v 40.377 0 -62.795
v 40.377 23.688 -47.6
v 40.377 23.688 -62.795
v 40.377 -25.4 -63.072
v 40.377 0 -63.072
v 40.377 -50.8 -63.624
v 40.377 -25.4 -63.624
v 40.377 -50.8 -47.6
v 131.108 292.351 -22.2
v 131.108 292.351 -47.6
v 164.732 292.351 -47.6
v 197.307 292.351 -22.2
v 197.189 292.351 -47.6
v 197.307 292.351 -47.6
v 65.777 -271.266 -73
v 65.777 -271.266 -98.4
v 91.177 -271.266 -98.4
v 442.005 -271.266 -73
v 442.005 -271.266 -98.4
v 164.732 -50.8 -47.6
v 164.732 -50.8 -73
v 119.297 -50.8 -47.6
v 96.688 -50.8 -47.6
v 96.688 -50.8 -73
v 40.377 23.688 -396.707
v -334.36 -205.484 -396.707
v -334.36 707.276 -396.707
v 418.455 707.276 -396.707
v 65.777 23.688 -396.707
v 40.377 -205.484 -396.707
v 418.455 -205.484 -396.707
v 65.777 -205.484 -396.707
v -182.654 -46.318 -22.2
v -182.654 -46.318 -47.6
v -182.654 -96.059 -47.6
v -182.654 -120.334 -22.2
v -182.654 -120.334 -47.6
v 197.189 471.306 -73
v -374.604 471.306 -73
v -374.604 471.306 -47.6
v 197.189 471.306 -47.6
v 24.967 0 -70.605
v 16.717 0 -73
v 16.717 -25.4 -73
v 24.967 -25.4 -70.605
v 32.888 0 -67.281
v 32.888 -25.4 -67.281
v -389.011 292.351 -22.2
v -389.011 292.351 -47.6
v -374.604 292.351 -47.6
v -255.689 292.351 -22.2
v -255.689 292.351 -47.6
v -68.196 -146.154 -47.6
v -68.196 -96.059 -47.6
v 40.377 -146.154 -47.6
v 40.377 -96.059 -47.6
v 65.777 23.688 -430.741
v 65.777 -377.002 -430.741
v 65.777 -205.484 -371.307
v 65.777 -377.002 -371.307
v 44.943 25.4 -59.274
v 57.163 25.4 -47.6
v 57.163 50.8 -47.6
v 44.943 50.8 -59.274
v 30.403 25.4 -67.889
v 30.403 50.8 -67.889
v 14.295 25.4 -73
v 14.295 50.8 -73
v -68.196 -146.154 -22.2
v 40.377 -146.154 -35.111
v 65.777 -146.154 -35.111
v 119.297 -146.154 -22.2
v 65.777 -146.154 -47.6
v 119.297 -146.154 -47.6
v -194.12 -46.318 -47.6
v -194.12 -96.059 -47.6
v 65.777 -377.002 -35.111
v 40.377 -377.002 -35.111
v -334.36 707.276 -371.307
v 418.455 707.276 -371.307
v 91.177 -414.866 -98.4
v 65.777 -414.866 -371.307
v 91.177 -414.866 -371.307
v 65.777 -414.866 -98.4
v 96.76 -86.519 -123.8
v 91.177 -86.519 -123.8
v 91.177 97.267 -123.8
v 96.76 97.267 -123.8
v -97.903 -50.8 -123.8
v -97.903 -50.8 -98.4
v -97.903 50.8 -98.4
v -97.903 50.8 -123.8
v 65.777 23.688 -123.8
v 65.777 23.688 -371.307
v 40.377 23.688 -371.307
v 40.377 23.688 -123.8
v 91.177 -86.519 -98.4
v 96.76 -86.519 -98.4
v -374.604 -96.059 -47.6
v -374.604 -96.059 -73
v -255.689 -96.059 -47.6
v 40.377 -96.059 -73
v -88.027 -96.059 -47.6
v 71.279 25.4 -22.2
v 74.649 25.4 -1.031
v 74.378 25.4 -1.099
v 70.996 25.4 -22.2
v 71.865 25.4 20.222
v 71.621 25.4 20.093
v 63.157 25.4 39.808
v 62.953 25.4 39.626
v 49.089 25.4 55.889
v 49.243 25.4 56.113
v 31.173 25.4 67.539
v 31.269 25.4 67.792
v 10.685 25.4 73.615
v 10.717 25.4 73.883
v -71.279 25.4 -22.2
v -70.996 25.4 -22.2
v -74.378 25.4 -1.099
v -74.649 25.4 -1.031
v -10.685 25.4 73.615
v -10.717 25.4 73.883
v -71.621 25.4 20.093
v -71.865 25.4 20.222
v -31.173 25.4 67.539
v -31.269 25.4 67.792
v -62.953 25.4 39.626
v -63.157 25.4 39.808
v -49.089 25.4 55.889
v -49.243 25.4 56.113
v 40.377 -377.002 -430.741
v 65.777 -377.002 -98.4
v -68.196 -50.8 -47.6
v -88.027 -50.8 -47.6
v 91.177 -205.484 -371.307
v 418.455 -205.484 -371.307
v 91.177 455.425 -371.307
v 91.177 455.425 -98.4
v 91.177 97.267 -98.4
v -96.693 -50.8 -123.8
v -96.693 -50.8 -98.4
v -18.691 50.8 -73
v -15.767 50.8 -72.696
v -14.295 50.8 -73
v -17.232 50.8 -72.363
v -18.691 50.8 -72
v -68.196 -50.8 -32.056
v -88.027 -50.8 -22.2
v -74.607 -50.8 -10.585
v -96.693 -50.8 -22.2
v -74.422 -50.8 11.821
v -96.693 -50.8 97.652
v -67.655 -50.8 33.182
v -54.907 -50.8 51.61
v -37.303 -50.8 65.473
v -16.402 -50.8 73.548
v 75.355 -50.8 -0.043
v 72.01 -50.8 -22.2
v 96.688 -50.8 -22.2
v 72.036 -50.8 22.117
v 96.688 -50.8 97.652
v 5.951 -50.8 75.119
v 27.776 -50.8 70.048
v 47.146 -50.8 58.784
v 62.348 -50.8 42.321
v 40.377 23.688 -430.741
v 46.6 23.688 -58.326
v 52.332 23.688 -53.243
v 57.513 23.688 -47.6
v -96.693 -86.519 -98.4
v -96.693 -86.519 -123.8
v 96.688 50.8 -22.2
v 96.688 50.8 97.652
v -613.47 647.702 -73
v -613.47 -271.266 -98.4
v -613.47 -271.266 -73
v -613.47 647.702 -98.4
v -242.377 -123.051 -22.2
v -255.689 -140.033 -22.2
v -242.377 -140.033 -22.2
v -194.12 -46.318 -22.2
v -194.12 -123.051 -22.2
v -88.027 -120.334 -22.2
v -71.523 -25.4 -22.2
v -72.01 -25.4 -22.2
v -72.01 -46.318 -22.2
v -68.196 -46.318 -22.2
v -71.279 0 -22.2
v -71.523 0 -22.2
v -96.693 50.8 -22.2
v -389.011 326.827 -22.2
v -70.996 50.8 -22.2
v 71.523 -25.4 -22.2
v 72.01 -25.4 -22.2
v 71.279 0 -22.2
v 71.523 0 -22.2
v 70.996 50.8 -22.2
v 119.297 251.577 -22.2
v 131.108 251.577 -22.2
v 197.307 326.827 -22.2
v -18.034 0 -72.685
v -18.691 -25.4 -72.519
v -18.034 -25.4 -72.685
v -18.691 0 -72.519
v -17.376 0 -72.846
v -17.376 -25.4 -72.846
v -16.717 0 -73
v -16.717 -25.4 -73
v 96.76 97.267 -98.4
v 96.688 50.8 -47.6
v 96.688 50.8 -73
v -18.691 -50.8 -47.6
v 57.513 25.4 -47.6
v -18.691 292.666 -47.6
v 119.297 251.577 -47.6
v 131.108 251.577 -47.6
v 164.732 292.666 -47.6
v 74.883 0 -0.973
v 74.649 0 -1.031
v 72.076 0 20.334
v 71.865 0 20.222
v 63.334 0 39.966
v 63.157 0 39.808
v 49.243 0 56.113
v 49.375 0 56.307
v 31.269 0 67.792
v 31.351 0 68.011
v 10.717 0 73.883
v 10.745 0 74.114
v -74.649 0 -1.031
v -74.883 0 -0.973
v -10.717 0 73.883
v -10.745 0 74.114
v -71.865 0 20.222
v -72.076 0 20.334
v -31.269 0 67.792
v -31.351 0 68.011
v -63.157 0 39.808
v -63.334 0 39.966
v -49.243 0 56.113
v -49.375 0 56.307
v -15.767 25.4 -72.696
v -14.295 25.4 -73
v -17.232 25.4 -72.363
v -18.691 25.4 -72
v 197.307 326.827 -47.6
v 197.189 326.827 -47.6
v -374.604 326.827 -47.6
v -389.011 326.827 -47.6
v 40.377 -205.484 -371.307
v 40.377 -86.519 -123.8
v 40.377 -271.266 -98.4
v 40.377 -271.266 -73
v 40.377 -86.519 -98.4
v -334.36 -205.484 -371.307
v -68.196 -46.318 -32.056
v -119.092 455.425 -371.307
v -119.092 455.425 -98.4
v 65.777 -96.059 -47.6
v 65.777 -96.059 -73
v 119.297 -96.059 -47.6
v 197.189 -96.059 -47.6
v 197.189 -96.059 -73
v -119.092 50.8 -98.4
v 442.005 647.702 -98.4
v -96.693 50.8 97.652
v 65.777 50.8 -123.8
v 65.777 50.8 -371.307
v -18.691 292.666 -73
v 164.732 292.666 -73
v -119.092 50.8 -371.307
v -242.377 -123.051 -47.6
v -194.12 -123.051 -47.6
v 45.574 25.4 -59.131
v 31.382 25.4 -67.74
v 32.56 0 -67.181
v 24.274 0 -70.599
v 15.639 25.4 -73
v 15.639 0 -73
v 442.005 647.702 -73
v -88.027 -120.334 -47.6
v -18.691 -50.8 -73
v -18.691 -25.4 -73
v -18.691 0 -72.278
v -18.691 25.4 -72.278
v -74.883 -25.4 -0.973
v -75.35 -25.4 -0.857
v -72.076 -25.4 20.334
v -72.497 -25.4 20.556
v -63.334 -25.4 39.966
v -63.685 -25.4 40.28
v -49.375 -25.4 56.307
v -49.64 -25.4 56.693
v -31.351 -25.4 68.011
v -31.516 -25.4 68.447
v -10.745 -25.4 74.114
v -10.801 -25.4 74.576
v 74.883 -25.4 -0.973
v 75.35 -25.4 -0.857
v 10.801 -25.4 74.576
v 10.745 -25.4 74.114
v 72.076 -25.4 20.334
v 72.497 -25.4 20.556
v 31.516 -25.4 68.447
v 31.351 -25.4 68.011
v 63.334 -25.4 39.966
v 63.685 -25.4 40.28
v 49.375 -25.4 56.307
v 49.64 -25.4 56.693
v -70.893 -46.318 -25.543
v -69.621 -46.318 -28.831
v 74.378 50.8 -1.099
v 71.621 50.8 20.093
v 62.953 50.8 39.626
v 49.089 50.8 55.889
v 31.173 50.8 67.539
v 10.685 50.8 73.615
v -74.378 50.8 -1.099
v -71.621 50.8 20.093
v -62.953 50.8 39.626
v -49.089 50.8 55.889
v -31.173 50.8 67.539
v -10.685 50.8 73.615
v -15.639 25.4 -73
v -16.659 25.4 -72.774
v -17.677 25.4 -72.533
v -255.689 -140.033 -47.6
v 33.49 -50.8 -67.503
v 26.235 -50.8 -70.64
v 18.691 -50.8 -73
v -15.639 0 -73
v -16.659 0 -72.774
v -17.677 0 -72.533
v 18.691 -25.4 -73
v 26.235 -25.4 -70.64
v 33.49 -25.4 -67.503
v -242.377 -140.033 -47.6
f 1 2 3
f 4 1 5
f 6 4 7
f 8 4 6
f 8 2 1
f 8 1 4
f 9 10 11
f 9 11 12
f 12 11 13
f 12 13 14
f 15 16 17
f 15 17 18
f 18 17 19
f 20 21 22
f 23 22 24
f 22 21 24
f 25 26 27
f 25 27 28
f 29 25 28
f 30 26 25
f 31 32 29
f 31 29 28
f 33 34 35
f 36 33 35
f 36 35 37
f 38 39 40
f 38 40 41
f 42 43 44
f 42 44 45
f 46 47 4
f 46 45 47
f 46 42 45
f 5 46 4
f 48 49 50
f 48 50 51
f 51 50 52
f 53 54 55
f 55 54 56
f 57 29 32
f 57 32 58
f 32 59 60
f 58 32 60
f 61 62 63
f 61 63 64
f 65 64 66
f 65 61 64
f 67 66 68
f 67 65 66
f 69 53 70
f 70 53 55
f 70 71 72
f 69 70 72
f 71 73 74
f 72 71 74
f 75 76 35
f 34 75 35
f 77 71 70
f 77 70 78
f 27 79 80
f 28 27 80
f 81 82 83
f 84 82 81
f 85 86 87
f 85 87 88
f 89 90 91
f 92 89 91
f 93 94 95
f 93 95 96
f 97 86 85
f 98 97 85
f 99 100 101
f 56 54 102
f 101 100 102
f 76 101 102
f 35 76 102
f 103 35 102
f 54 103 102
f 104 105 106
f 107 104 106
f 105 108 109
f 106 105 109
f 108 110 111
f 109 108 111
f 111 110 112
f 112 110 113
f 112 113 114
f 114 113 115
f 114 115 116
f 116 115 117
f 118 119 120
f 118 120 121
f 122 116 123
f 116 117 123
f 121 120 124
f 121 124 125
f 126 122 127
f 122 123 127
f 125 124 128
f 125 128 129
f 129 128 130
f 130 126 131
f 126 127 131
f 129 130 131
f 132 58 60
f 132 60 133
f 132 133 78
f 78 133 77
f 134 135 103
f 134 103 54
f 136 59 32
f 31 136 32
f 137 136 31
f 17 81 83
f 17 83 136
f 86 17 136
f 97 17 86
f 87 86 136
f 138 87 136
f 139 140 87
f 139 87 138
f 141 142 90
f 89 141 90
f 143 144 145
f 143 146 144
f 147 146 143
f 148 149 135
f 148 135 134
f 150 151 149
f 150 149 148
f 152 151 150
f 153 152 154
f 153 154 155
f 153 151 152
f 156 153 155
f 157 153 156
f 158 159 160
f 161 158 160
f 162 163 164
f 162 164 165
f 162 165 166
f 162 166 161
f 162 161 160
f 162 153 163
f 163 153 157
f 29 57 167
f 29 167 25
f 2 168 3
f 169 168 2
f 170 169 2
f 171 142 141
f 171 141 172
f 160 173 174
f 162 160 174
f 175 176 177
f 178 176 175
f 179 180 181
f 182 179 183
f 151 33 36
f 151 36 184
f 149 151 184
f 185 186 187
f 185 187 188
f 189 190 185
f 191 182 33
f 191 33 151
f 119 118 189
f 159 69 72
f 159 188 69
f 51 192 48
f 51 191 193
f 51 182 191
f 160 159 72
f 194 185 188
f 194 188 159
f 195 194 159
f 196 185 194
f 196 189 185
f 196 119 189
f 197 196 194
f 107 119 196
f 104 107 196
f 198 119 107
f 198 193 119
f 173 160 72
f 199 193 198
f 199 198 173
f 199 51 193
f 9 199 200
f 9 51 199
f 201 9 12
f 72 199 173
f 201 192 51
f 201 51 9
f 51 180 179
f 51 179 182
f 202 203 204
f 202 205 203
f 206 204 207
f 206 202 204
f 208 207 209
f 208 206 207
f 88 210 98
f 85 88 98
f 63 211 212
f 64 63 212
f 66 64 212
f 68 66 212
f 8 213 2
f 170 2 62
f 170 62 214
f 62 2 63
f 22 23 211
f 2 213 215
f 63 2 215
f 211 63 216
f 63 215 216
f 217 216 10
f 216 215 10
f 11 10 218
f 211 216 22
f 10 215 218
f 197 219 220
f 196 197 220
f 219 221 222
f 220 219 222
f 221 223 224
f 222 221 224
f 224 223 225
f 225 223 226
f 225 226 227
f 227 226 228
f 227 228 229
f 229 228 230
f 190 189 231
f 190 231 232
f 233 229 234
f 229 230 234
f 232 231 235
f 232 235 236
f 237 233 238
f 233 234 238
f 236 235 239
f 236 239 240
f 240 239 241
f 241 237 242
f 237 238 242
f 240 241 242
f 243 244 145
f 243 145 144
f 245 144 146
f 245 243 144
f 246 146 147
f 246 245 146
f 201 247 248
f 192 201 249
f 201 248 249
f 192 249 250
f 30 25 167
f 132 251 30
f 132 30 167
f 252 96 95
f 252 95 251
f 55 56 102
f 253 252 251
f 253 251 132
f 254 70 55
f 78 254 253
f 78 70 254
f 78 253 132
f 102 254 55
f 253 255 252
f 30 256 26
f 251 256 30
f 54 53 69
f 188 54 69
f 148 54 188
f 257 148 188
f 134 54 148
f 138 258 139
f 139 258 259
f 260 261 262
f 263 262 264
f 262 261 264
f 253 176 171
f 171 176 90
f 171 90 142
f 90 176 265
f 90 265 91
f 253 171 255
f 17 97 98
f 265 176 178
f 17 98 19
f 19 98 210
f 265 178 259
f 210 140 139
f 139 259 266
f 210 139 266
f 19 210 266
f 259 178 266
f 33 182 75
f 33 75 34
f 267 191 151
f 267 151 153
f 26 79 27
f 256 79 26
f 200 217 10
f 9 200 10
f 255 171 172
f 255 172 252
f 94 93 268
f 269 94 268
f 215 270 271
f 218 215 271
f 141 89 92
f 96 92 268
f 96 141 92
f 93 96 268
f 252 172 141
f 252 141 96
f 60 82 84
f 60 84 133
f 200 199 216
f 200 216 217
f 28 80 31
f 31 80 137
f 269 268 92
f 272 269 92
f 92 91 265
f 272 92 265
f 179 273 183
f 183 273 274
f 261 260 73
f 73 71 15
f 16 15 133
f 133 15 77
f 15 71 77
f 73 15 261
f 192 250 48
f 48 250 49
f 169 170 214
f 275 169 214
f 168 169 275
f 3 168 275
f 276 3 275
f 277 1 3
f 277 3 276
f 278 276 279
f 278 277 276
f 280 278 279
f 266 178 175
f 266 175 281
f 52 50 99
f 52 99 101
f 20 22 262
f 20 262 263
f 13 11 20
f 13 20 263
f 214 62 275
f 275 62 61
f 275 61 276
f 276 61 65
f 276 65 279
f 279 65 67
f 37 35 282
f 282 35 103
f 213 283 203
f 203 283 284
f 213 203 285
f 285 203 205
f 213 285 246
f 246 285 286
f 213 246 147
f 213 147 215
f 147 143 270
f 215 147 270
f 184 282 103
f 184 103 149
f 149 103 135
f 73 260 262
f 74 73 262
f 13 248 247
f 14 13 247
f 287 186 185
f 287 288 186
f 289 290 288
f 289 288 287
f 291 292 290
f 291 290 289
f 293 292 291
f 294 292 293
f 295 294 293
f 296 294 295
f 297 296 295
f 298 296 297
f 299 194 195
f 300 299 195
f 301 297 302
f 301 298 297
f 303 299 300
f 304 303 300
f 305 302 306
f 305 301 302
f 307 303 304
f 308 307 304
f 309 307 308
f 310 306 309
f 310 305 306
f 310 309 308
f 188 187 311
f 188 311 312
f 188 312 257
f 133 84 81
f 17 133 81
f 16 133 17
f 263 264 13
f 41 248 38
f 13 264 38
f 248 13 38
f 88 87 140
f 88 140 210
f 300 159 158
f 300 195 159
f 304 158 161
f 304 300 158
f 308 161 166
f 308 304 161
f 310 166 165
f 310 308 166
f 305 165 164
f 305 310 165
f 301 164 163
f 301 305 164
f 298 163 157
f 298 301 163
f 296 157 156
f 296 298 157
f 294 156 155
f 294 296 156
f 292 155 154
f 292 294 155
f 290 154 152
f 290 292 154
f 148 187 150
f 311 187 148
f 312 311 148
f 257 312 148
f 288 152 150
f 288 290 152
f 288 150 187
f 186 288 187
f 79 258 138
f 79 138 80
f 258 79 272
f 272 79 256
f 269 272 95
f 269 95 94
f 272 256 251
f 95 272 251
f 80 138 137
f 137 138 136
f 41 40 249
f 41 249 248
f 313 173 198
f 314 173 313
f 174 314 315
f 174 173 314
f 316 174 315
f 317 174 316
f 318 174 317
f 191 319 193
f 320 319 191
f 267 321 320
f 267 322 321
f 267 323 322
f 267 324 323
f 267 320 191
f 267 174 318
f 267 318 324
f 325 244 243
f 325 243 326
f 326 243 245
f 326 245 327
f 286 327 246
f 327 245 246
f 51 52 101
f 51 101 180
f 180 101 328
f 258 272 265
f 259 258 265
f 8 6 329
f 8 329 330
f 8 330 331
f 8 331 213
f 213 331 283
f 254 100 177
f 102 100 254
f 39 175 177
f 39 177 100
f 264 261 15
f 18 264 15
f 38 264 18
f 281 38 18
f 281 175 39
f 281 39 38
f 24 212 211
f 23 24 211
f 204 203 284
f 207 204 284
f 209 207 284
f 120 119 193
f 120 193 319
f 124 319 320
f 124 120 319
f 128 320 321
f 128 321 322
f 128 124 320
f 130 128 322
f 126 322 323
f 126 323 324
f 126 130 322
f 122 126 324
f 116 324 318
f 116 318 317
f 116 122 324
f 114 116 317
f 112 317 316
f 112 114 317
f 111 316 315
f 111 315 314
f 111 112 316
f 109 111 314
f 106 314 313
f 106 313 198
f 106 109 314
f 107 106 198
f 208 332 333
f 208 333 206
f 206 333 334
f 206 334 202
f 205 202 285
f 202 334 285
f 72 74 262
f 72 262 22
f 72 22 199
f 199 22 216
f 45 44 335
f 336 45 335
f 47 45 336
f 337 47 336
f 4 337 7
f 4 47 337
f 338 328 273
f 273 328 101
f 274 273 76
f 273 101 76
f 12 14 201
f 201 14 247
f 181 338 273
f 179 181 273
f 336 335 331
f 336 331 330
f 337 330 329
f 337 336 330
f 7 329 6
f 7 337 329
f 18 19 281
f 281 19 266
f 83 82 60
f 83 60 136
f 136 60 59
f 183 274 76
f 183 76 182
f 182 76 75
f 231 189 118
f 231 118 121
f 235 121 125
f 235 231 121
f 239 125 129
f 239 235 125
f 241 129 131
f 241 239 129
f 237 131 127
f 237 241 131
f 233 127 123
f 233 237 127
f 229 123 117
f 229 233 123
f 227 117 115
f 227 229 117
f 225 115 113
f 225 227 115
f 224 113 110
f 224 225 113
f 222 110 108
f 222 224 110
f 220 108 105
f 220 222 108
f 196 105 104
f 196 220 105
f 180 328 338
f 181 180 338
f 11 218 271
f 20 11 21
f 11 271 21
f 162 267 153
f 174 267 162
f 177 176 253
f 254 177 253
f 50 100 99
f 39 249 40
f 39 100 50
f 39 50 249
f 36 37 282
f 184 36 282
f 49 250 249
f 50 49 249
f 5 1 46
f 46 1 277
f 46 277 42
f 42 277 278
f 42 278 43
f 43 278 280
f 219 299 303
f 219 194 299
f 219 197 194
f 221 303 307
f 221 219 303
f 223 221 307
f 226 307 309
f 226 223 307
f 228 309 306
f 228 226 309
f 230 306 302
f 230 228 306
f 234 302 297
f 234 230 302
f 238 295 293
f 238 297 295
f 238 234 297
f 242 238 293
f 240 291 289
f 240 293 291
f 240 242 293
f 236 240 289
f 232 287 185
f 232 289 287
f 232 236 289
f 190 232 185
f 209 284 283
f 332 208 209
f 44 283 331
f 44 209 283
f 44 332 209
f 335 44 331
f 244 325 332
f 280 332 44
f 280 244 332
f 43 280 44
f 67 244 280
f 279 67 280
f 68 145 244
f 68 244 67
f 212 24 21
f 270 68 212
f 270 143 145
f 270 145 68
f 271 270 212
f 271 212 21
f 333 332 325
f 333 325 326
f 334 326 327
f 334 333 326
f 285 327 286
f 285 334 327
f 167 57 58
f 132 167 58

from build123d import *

# Parameters (mm, degrees)
F0_W      = 193.3809220791
F0_H      = 196.0519328713
F0_R      = 74.8892897361
F1_DEPTH  = 25.4
F2_W      = 193.3809220791
F2_H      = 196.0519328713
F2_R      = 74.655991807
F3_DEPTH  = 25.4
F4_W      = 176.1402115226
F4_H      = 196.0519328713
F4_R      = 74.3860816692
F4_W_2    = 17.2407105565
F5_DEPTH  = 25.4
F6_W      = 193.3809220791
F6_H      = 196.0519328713
F6_R      = 75.3545401658
F7_DEPTH  = 25.4
F8_W      = 193.4532523155
F8_H      = 35.7192189813
F9_DEPTH  = 25.4
F11_DEPTH = 404.6249985695
F12_W     = 1055.474460125
F12_H     = 918.9680218697
F13_DEPTH = 25.4
F14_W     = 752.8154850006
F14_H     = 912.7593636513
F15_DEPTH = 25.4
F16_W     = 870.2914460182
F16_H     = 272.9075178504
F17_DEPTH = 25.4
F18_W     = 400.6907343864
F18_H     = 395.6300988793
F19_DEPTH = 25.4
F20_W     = 571.7930793762
F20_H     = 567.36561656
F21_DEPTH = 25.4
F23_W     = 78.0102312565
F23_H     = 34.4761013985
F23_W_2   = 13.3122801781
F23_H_2   = 332.7346146107
F23_W_3   = 187.4931752682
F23_H_3   = 105.7706475258
F23_H_4   = 99.6497869492
F24_DEPTH = 25.4
F25_W     = 101.5389561653
F25_H     = 251.5766620636
F25_H_2   = 50.2630472183
F25_W_2   = 29.5691788197
F25_W_3   = 54.5960366726
F25_H_3   = 76.733738184
F26_DEPTH = 25.4


with BuildPart() as f1:
    # F0 (on Front) → F1 (new body)
    with BuildSketch(Plane.XZ):
        with Locations((-0.0024288893, -0.3737099469)):
            Rectangle(F0_W, F0_H)
        Circle(F0_R, mode=Mode.SUBTRACT)
    extrude(amount=F1_DEPTH)

    # F2 (on face) → F3 (join)
    with BuildSketch(Plane(origin=(0, 0, 0), x_dir=(-1, 0, 0), z_dir=(0, 1, 0))):
        with Locations((0.0024288893, -0.3737099469)):
            Rectangle(F2_W, F2_H)
        Circle(F2_R, mode=Mode.SUBTRACT)
    extrude(amount=F3_DEPTH)

    # F4 (on face) → F5 (join)
    with BuildSketch(Plane(origin=(0, 25.4, 0), x_dir=(-1, 0, 0), z_dir=(0, 1, 0))):
        with Locations((-8.617926389, -0.3737099469)):
            Rectangle(F4_W, F4_H)
        Circle(F4_R, mode=Mode.SUBTRACT)
        with Locations((88.0725346506, -0.3737099469)):
            Rectangle(F4_W_2, F4_H)
    extrude(amount=F5_DEPTH)

    # F6 (on face) → F7 (join)
    with BuildSketch(Plane.XZ.offset(25.4)):
        with Locations((-0.0024288893, -0.3737099469)):
            Rectangle(F6_W, F6_H)
        Circle(F6_R, mode=Mode.SUBTRACT)
    extrude(amount=F7_DEPTH)

    # F8 (on face) → F9 (join)
    with BuildSketch(Plane(origin=(0, 0, -98.3996763825), x_dir=(1, 0, 0), z_dir=(0, 0, -1))):
        with Locations((0.0337362289, 68.6596094906)):
            Rectangle(F8_W, F8_H)
        Polygon((96.7603623867, 50.8), (-96.6928899288, 50.8), (-97.9034900665, 50.8), (-97.9034900665, -97.2673520446), (96.7603623867, -97.2673520446), align=None)
    extrude(amount=F9_DEPTH)

    # F10 (on face) → F11 (join)
    with BuildSketch(Plane(origin=(0, 50.8, 0), x_dir=(-1, 0, 0), z_dir=(0, 1, 0))):
        Polygon((-65.7769590616, -350.3327965736), (-65.7769590616, -371.3071942329), (119.0916895866, -371.3071942329), (119.0916895866, -98.3996763825), (-65.7769590616, -98.3996763825), align=None)
    extrude(amount=F11_DEPTH)

    # F12 (on face) → F13 (join)
    with BuildSketch(Plane.XY.offset(-98.3996763825)):
        with Locations((-85.7326686382, 188.2182061672)):
            Rectangle(F12_W, F12_H)
    extrude(amount=F13_DEPTH)

    # F14 (on face) → F15 (join)
    with BuildSketch(Plane(origin=(0, 0, -371.3071942329), x_dir=(1, 0, 0), z_dir=(0, 0, -1))):
        with Locations((42.0474410057, -250.8960068226)):
            Rectangle(F14_W, F14_H)
    extrude(amount=F15_DEPTH)

    # F16 (on face) → F17 (join)
    with BuildSketch(Plane.YZ.offset(65.7769590616)):
        with Locations((20.2792755604, -234.8534353077)):
            Rectangle(F16_W, F16_H)
    extrude(amount=F17_DEPTH)

    # F18 (on face) → F19 (join)
    with BuildSketch(Plane(origin=(65.7769590616, 0, 0), x_dir=(0, -1, 0), z_dir=(-1, 0, 0))):
        with Locations((176.6569912434, -232.9259328544)):
            Rectangle(F18_W, F18_H)
    extrude(amount=F19_DEPTH)

    # F20 (on face) → F21 (join)
    with BuildSketch(Plane.XY.offset(-72.9996763825)):
        with Locations((-88.7070894241, 187.6235455275)):
            Rectangle(F20_W, F20_H)
        Polygon((40.3769590616, -50.8), (-18.691013125, -50.8), (-18.691013125, 275.1325964928), (-18.691013125, 292.6656007767), (40.3769590616, 292.6656007767), (164.7324860096, 292.6656007767), (164.7324860096, -50.8), (129.8503279686, -50.8), align=None, mode=Mode.SUBTRACT)
    extrude(amount=F21_DEPTH)

    # F23 (on face) → F24 (join)
    with BuildSketch(Plane.XY.offset(-47.5996763825)):
        Polygon((119.2969679832, -40.3836667538), (119.2969679832, 292.3509478569), (-242.377102375, 292.3509478569), (-242.377102375, -40.3836667538), (-68.1962072849, -40.3836667538), align=None)
        with Locations((158.3020836115, 309.5889985561)):
            Rectangle(F23_W, F23_H)
        Polygon((-242.377102375, 292.3509478569), (119.2969679832, 292.3509478569), (119.2969679832, 326.8270492554), (-389.0109658241, 326.8270492554), (-389.0109658241, 292.3509478569), (-255.6893825531, 292.3509478569), align=None)
        with Locations((-249.0332424641, 125.9836405516)):
            Rectangle(F23_W_2, F23_H_2)
        with Locations((25.5503803492, -93.2689905167)):
            Rectangle(F23_W_3, F23_H_3)
        with Locations((-249.0332424641, -90.2085602283)):
            Rectangle(F23_W_2, F23_H_4)
    extrude(amount=F24_DEPTH)

    # F25 (on face) → F26 (join)
    with BuildSketch(Plane.XY.offset(-47.5996763825)):
        Polygon((101.5389561653, 0), (0, 0), (-69.8948949575, 0), (-69.8948949575, -46.3175177574), (101.5389561653, -46.3175177574), align=None)
        Polygon((-69.8948949575, 0), (0, 0), (0, 251.5766620636), (0, 301.8397092819), (-69.8948949575, 301.8397092819), (-69.8948949575, 239.4688427448), align=None)
        with Locations((50.7694780827, 125.7883310318)):
            Rectangle(F25_W, F25_H)
        Polygon((-69.8948949575, -46.3175177574), (-69.8948949575, 0), (-69.8948949575, 239.4688427448), (-116.5921464562, 239.4688427448), (-116.5921464562, -46.3175177574), (-88.026702404, -46.3175177574), align=None)
        with Locations((50.7694780827, 276.7081856728)):
            Rectangle(F25_W, F25_H_2)
        Polygon((-116.5921464562, 239.4688427448), (-69.8948949575, 239.4688427448), (-69.8948949575, 301.8397092819), (-248.7161755562, 301.8397092819), (-248.7161755562, 239.4688427448), align=None)
        with Locations((116.3235455751, 276.7081856728)):
            Rectangle(F25_W_2, F25_H_2)
        Polygon((-116.5921464562, -46.3175177574), (-116.5921464562, 239.4688427448), (-248.7161755562, 239.4688427448), (-248.7161755562, -46.3175177574), (-194.1201388836, -46.3175177574), (-182.6541610062, -46.3175177574), align=None)
        Polygon((-88.026702404, -120.3344464302), (-88.026702404, -46.3175177574), (-116.5921464562, -46.3175177574), (-182.6541610062, -46.3175177574), (-182.6541610062, -120.3344464302), align=None)
        with Locations((-221.4181572199, -84.6843868494)):
            Rectangle(F25_W_3, F25_H_3)
    extrude(amount=F26_DEPTH)


solid = f1.part
